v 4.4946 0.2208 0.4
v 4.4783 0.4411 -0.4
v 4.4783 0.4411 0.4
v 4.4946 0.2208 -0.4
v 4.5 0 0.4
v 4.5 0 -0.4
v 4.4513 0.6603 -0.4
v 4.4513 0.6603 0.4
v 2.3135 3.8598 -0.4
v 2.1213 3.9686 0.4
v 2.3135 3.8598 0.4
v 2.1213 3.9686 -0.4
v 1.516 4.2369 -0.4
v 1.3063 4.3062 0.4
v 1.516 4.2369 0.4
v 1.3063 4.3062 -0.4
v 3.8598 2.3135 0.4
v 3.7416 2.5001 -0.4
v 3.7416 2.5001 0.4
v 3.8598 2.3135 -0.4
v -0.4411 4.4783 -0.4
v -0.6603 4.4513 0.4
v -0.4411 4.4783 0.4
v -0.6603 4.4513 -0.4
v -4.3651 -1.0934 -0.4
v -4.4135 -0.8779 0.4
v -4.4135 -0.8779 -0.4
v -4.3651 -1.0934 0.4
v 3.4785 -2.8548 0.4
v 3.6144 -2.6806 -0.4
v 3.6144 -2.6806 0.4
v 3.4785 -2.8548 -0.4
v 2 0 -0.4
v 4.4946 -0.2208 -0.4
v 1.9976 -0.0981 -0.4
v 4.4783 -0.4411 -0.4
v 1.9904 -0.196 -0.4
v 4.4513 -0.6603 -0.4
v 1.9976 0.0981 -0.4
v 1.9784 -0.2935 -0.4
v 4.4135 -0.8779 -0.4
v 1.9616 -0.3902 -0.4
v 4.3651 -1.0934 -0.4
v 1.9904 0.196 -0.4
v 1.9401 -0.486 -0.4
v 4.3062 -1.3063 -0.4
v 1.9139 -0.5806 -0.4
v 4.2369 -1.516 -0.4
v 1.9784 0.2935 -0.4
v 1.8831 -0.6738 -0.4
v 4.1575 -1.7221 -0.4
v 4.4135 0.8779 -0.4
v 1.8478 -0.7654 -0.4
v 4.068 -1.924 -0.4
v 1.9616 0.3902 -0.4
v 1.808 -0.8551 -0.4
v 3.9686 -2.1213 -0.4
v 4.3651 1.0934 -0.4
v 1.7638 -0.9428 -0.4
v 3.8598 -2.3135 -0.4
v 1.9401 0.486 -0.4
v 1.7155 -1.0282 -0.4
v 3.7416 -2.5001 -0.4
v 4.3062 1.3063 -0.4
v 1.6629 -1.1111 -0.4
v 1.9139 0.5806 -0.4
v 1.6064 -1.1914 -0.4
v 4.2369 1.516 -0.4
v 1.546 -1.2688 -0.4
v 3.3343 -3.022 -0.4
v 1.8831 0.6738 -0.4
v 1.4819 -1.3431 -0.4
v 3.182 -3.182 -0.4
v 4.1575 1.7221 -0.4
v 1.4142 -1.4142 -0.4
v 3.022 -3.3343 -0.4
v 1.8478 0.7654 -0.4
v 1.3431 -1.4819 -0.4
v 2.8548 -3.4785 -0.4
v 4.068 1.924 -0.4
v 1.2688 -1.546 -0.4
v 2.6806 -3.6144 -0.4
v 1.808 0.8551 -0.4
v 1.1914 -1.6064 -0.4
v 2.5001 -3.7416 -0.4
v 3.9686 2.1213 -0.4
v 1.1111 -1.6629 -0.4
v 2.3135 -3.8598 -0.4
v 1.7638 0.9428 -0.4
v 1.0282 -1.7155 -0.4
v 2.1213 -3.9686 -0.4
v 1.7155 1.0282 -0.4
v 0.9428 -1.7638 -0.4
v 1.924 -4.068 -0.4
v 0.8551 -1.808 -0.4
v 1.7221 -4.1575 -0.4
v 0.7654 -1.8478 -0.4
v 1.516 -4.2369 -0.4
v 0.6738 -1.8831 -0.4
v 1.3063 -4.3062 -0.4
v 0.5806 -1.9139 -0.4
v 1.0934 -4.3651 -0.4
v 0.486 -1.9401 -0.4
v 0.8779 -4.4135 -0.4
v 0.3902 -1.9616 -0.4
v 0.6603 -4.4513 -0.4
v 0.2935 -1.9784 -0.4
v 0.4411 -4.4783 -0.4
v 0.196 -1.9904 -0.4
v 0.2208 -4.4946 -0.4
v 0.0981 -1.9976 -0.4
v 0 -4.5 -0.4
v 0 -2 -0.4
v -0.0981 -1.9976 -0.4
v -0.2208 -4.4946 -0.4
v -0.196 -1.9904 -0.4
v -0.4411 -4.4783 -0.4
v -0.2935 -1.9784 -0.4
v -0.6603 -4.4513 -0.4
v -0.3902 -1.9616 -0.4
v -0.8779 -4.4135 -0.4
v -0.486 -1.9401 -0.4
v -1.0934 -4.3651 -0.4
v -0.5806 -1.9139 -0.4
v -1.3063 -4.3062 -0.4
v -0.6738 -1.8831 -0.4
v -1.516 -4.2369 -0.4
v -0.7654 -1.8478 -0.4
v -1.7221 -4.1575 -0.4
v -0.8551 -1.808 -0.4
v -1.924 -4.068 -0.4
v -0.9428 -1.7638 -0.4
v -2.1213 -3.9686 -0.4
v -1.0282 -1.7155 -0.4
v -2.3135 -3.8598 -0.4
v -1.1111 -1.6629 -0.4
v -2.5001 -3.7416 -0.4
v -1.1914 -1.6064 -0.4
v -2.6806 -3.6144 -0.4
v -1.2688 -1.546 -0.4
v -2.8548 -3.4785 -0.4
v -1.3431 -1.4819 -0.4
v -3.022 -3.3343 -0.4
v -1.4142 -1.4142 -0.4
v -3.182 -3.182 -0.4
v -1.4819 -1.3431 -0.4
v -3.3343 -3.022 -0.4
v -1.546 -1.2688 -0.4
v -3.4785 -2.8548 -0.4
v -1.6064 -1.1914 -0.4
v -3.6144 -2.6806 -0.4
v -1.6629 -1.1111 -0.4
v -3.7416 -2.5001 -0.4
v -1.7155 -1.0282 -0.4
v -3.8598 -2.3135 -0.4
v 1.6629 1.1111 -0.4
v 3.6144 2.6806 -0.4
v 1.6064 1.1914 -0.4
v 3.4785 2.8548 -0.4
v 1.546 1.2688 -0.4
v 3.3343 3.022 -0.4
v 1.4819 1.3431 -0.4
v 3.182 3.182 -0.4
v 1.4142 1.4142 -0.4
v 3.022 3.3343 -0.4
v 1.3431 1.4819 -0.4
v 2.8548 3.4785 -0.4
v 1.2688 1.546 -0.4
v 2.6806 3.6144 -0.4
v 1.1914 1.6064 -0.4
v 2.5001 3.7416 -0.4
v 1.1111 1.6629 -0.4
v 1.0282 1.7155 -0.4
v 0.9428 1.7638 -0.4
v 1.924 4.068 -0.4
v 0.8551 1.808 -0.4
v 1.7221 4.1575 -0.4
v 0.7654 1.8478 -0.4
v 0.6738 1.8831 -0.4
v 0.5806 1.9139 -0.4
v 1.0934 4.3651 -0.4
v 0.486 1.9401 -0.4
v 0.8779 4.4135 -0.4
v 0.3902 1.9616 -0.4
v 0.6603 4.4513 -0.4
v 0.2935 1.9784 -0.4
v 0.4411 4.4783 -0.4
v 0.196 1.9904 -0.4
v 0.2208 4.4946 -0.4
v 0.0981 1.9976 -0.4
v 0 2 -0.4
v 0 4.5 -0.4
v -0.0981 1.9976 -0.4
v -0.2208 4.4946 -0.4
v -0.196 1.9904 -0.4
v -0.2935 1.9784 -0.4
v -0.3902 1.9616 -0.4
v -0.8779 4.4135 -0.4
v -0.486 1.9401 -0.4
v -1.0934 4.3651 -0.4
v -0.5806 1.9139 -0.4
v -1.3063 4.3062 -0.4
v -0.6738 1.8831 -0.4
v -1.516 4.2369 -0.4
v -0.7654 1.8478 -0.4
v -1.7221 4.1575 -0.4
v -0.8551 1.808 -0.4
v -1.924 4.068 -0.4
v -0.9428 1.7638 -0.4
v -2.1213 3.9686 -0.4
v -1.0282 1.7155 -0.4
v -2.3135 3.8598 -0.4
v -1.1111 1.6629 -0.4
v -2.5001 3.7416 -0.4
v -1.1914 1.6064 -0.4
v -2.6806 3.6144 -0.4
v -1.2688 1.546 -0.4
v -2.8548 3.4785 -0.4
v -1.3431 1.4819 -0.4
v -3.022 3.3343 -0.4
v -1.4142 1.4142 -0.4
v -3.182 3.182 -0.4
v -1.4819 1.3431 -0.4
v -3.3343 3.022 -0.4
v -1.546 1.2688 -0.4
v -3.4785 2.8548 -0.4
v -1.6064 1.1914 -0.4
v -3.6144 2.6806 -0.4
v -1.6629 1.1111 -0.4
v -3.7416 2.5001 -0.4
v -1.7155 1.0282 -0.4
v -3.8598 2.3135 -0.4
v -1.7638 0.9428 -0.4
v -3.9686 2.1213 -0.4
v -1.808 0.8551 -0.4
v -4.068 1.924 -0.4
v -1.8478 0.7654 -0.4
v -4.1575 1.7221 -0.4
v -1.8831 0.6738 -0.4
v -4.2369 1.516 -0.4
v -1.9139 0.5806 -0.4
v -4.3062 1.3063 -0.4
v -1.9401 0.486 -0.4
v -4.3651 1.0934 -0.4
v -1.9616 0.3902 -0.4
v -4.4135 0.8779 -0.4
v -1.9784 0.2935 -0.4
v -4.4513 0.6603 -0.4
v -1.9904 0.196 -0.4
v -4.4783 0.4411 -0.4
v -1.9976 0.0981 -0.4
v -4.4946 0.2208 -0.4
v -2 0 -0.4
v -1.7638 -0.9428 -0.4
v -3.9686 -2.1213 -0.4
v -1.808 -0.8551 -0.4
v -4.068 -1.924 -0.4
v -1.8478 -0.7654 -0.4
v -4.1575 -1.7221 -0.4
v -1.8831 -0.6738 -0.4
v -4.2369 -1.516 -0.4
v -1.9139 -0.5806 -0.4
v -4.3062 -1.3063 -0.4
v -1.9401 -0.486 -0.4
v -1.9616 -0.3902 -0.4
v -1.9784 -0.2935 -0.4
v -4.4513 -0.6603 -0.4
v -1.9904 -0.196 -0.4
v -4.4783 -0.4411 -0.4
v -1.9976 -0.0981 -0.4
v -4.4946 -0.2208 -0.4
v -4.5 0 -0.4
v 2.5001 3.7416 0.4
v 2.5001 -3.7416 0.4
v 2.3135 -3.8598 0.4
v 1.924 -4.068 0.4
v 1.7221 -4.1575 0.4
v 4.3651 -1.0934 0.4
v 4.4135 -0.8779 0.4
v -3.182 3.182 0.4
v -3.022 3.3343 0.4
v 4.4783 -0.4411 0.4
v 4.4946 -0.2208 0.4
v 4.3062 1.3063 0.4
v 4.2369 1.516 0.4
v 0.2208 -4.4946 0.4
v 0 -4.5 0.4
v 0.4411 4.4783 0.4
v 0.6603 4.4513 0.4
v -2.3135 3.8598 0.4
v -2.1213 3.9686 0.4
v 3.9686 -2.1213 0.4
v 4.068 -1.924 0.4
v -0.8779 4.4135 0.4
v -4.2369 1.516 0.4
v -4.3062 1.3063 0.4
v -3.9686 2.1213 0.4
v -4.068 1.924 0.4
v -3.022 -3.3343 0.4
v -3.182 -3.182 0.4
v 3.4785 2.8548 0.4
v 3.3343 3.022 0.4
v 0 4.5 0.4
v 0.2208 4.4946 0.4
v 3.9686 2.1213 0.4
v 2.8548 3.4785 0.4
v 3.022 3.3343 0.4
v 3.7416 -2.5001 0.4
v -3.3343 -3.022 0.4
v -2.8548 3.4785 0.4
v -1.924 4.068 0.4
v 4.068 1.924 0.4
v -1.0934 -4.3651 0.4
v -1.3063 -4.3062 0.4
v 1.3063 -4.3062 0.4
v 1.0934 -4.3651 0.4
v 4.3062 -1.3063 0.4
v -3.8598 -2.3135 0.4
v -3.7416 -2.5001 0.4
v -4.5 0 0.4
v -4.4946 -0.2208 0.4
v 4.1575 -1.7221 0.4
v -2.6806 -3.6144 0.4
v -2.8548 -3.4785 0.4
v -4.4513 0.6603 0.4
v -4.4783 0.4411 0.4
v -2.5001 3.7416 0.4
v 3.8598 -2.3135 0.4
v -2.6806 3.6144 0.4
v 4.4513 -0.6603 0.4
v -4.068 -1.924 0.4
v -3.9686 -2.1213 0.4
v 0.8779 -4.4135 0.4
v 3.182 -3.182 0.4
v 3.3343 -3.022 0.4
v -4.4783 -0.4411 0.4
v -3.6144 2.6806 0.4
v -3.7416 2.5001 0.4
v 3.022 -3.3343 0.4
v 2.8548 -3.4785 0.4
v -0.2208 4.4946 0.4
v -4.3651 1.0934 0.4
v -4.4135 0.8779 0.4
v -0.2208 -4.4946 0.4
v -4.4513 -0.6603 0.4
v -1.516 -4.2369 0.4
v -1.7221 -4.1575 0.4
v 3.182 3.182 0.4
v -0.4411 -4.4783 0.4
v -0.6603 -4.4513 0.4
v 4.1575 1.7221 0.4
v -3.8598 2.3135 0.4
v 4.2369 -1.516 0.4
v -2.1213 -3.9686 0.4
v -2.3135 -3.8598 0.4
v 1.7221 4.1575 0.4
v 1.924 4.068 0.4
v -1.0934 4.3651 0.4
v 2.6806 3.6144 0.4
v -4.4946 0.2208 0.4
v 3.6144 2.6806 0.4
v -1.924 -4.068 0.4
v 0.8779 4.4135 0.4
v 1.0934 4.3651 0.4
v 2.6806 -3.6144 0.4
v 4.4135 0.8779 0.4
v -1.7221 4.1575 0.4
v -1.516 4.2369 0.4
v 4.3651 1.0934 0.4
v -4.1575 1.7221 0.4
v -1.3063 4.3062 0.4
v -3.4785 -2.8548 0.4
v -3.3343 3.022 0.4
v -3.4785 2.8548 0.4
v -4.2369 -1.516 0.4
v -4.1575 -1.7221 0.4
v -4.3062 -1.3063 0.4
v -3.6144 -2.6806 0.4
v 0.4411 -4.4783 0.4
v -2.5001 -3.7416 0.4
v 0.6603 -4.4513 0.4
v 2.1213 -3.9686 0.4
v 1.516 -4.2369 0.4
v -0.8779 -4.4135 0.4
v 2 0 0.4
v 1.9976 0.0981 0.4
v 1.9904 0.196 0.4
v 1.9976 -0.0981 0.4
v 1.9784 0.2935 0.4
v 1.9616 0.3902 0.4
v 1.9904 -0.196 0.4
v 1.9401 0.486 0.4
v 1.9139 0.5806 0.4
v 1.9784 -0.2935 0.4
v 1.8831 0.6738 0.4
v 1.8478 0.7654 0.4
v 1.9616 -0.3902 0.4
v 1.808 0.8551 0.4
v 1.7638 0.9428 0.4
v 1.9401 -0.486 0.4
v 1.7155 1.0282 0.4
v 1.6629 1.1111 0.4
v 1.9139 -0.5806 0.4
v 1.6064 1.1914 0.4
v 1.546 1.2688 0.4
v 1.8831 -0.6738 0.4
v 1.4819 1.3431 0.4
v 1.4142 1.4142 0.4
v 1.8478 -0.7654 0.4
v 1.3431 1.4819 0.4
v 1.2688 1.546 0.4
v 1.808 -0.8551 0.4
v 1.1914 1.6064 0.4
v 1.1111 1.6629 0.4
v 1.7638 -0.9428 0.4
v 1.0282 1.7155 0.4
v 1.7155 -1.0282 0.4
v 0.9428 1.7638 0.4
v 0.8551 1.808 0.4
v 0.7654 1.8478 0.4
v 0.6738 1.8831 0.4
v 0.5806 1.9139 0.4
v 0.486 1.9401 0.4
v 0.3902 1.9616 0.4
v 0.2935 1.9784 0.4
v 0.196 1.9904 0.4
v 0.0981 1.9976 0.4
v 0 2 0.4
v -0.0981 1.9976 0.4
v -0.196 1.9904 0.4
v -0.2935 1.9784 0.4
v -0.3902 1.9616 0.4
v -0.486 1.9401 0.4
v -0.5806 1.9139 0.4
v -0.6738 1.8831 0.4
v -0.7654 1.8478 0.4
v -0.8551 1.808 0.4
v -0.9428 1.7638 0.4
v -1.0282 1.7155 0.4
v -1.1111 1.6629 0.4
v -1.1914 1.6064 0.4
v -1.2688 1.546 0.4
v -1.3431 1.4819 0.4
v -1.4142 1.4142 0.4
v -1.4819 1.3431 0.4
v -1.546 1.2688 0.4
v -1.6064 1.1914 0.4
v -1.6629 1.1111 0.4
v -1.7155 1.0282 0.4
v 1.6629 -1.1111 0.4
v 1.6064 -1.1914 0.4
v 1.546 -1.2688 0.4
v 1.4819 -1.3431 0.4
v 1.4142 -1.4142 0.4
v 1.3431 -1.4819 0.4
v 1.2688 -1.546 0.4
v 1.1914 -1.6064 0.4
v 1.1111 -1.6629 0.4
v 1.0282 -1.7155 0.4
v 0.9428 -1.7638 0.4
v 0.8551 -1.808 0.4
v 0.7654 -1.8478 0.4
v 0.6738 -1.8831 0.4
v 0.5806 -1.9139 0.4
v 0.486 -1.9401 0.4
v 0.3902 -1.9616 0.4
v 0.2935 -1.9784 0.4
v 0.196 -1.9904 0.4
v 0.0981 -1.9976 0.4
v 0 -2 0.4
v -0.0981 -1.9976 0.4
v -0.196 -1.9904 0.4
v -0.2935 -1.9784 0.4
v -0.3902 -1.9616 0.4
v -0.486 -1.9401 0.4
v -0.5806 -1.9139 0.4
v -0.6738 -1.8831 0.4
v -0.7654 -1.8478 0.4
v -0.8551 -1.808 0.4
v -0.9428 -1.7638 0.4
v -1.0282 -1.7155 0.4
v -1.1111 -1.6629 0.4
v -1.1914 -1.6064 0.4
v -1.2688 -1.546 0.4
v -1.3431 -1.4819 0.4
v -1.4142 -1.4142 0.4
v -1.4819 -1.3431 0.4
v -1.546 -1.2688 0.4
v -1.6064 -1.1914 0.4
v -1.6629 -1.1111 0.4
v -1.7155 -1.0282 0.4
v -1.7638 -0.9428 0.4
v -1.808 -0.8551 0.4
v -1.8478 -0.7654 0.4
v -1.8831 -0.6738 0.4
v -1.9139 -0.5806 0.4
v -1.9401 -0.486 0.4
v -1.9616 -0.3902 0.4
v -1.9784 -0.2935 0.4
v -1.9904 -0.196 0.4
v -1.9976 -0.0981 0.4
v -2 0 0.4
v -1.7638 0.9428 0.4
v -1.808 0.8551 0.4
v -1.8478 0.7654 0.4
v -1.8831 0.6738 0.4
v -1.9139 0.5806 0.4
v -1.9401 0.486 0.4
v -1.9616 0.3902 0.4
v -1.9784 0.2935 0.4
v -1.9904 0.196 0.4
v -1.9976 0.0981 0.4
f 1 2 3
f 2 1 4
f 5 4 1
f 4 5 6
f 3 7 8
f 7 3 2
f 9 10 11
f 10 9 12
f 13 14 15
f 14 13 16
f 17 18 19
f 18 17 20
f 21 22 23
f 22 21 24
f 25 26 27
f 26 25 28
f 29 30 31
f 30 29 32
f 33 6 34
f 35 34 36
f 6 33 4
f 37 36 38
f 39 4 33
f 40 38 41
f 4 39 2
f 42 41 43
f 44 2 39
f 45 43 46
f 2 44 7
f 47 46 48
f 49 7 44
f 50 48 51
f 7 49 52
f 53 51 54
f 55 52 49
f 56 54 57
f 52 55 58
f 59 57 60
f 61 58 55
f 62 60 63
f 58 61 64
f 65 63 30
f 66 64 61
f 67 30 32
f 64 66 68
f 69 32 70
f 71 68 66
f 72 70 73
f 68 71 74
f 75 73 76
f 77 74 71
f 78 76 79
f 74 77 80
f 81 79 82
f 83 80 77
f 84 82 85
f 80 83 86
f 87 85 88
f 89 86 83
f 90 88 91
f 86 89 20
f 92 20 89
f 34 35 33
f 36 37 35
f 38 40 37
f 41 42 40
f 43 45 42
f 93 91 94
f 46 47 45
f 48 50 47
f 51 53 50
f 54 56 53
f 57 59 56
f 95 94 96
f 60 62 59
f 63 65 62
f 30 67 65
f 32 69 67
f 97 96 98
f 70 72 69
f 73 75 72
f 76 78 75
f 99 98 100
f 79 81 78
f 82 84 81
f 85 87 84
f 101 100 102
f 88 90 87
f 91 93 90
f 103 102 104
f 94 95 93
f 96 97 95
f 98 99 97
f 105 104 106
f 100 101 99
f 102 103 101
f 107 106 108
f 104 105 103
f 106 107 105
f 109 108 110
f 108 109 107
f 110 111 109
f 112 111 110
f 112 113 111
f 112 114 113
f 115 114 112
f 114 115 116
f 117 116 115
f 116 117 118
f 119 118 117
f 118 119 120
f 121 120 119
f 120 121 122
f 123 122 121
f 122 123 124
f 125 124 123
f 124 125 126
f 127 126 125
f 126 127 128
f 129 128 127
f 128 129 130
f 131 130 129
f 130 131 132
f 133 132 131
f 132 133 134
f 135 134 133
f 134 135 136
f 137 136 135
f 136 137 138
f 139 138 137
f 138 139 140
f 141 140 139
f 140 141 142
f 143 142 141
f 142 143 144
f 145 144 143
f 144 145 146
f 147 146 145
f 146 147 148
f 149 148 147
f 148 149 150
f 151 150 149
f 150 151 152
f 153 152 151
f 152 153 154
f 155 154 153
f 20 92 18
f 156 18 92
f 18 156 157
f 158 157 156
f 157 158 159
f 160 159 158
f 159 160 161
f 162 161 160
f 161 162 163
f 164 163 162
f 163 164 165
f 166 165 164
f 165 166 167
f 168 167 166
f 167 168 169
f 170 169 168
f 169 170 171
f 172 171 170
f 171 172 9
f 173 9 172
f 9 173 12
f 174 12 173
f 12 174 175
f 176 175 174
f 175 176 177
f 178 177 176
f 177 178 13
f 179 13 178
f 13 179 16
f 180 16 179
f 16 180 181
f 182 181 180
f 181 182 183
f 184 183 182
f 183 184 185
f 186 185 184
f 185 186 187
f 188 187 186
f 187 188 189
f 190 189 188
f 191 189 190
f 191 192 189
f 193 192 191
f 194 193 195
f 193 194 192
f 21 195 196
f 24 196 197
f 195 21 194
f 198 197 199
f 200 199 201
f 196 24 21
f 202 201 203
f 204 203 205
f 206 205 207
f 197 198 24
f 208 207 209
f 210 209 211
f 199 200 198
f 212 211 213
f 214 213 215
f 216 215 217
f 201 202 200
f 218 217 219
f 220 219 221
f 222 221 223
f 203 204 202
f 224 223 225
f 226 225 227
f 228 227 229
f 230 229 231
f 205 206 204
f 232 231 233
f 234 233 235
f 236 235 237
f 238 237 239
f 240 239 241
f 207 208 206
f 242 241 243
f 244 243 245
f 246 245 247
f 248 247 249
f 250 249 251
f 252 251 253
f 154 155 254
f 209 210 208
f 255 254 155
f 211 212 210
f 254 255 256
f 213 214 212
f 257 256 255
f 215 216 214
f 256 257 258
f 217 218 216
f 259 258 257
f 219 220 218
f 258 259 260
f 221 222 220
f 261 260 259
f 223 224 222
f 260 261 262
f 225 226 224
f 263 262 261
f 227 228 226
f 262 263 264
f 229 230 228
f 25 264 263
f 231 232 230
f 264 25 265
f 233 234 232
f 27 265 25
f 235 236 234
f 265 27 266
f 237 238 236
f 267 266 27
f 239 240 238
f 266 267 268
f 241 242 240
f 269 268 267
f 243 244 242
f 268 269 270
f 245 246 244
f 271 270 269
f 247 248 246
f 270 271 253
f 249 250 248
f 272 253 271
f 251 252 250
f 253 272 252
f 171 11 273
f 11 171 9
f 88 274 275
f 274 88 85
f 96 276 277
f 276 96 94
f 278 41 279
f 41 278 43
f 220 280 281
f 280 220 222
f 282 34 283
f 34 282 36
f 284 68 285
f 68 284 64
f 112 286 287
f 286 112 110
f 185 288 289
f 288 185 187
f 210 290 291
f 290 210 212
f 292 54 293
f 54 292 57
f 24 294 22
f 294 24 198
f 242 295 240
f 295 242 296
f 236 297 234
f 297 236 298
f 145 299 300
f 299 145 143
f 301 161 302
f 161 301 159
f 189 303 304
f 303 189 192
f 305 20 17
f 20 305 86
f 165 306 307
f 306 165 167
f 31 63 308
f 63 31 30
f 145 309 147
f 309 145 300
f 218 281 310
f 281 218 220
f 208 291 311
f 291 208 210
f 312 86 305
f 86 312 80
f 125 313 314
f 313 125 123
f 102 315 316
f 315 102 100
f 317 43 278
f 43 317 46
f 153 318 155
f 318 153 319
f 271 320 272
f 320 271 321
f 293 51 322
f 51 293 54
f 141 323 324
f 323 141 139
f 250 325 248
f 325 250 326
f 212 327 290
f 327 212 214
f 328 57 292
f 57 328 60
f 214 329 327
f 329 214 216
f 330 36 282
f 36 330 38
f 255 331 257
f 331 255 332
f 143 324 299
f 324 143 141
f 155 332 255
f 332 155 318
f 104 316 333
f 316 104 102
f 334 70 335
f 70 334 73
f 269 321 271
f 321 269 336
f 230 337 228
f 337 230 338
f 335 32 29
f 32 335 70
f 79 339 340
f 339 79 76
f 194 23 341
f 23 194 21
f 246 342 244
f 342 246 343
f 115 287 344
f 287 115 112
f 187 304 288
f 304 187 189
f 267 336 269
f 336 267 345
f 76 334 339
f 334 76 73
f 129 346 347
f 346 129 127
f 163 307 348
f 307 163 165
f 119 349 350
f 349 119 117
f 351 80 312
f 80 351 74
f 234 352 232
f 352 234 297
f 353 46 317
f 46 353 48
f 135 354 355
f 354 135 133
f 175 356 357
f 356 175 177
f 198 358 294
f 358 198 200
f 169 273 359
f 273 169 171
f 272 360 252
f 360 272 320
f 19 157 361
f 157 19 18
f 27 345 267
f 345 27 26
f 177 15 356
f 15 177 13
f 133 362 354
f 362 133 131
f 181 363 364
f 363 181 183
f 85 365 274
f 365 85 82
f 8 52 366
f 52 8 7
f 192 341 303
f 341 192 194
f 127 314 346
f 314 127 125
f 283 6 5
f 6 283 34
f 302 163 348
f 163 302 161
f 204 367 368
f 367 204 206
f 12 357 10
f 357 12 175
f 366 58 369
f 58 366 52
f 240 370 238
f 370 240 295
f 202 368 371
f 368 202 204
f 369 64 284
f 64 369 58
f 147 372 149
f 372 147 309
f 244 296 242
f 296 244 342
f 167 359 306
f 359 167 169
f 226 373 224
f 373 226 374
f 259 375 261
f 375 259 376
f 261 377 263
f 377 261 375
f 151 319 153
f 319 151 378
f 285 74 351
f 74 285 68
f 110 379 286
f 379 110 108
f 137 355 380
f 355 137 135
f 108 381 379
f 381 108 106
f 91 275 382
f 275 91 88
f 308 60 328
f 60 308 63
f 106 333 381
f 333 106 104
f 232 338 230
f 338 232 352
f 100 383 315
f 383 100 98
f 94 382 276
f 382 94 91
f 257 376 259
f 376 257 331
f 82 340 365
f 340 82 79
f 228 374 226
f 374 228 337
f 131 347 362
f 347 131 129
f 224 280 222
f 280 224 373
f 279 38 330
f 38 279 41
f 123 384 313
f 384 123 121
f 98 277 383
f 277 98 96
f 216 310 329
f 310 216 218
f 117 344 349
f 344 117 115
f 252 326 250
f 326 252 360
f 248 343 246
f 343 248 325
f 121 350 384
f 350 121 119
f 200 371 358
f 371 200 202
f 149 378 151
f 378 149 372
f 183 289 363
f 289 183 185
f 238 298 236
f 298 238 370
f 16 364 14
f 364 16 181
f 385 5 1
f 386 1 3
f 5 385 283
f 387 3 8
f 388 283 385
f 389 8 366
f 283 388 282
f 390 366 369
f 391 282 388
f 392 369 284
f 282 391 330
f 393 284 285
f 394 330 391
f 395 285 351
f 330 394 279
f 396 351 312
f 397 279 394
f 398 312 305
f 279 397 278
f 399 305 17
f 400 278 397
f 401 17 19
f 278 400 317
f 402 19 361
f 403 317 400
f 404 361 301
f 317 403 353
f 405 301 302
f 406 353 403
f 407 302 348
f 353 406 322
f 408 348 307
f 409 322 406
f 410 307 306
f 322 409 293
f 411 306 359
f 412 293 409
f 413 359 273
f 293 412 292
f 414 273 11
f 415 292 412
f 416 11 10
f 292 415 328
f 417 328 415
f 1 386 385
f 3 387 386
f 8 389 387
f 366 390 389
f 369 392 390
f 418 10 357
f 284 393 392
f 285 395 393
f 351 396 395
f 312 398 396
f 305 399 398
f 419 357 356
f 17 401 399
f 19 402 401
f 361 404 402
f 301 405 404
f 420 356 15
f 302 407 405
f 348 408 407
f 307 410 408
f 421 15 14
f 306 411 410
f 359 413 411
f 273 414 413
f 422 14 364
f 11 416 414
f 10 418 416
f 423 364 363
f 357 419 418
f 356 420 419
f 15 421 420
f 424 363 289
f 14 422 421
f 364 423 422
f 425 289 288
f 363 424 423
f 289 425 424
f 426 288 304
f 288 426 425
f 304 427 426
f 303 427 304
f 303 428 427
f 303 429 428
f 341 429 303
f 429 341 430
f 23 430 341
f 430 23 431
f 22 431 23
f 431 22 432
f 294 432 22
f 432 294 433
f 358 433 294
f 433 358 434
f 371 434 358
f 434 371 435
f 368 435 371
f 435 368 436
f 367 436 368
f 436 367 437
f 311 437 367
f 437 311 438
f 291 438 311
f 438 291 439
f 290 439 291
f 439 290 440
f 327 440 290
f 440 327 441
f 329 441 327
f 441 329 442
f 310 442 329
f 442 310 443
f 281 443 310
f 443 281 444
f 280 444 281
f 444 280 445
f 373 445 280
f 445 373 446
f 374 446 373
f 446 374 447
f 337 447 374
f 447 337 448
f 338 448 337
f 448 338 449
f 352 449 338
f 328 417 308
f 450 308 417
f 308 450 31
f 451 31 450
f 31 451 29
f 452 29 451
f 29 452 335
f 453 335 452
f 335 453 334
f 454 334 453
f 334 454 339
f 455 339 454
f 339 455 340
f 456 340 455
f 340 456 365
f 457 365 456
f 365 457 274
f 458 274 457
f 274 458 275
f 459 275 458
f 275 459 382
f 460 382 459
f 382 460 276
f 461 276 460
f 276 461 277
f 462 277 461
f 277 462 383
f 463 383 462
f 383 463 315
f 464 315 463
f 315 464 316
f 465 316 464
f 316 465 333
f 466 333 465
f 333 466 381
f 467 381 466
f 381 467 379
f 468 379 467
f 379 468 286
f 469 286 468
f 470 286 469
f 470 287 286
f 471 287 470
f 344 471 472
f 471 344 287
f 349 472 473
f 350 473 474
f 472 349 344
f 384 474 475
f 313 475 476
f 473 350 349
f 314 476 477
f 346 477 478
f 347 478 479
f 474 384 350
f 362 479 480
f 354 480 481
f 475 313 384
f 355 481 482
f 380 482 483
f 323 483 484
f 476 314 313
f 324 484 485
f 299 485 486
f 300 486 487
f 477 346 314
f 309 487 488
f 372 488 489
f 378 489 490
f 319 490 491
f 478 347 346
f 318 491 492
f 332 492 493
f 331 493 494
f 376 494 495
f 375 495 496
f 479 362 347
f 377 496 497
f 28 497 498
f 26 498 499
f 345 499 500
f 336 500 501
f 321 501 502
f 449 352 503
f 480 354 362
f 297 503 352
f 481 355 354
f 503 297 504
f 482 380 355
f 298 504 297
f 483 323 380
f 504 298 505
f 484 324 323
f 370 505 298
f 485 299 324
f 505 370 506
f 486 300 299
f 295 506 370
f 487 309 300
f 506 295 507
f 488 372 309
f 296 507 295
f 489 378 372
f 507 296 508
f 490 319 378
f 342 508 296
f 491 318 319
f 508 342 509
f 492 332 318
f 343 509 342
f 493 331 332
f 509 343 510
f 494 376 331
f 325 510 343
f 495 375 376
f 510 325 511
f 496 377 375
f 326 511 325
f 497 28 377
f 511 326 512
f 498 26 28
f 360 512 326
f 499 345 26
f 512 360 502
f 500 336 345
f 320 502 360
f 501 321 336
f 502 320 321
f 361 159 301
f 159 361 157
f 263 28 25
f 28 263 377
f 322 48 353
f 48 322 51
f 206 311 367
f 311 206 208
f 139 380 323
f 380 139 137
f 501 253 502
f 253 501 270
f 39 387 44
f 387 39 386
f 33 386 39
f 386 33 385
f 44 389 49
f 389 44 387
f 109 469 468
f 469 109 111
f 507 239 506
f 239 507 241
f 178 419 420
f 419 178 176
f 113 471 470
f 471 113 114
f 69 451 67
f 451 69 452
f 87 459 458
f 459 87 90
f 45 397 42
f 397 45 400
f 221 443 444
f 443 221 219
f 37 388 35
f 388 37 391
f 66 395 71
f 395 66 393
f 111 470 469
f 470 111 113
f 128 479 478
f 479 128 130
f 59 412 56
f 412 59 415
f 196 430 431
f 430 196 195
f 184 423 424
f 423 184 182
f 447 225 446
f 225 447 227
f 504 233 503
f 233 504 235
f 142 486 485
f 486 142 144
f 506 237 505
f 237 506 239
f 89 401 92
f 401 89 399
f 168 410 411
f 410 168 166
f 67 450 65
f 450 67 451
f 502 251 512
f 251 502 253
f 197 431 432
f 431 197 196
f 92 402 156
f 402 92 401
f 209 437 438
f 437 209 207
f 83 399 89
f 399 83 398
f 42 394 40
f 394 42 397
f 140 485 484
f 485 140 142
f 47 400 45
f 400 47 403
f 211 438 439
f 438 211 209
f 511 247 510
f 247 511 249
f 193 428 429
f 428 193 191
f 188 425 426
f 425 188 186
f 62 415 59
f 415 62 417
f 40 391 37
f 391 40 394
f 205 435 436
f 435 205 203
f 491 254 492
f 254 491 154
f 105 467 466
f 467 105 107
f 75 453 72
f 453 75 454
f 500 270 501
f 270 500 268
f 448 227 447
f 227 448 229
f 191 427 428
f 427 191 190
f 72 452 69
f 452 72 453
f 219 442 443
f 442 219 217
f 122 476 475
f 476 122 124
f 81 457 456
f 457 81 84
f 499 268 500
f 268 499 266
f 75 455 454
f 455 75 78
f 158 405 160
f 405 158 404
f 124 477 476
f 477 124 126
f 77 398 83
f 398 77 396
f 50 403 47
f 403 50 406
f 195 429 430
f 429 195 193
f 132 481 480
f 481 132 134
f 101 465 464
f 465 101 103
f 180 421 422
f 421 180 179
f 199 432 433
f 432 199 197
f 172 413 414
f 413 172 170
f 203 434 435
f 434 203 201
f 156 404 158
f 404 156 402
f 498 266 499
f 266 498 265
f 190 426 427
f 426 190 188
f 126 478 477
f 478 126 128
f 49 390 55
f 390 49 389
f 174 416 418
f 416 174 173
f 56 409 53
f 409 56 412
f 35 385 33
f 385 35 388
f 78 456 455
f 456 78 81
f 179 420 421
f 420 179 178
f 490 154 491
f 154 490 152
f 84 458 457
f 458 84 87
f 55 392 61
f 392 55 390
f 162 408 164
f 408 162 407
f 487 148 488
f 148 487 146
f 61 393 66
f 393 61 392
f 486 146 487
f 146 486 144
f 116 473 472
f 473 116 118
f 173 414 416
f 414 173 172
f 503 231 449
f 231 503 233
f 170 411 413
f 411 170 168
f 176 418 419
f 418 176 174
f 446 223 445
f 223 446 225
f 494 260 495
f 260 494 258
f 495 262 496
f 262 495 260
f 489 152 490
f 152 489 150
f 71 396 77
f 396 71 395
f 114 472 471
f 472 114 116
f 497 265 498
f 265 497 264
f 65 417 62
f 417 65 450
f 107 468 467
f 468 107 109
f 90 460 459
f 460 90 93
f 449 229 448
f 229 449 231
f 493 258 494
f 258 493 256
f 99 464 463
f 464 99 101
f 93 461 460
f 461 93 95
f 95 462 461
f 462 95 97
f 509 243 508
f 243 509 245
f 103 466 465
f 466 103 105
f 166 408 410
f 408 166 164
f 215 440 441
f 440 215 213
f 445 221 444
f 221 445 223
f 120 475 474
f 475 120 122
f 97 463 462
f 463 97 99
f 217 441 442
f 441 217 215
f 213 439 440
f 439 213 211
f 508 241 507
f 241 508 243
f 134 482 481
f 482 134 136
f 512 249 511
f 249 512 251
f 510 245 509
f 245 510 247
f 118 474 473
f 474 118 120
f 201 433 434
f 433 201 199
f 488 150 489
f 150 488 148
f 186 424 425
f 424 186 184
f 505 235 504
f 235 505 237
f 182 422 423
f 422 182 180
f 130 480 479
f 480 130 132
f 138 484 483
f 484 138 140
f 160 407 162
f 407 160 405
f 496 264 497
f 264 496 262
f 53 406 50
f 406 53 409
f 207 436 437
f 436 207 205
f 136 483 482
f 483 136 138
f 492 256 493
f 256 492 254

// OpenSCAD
// Flat washer parameters (mm)
inner_diameter = 4.0;   // through-hole diameter
outer_diameter = 9.0;   // outside diameter
thickness      = 0.8;   // washer thickness

$fn = 128;

module flat_washer(id, od, h) {
    difference() {
        cylinder(d=od, h=h, center=true);
        cylinder(d=id, h=h + 0.2, center=true); // slight extra to guarantee clean through-hole
    }
}

flat_washer(inner_diameter, outer_diameter, thickness);
